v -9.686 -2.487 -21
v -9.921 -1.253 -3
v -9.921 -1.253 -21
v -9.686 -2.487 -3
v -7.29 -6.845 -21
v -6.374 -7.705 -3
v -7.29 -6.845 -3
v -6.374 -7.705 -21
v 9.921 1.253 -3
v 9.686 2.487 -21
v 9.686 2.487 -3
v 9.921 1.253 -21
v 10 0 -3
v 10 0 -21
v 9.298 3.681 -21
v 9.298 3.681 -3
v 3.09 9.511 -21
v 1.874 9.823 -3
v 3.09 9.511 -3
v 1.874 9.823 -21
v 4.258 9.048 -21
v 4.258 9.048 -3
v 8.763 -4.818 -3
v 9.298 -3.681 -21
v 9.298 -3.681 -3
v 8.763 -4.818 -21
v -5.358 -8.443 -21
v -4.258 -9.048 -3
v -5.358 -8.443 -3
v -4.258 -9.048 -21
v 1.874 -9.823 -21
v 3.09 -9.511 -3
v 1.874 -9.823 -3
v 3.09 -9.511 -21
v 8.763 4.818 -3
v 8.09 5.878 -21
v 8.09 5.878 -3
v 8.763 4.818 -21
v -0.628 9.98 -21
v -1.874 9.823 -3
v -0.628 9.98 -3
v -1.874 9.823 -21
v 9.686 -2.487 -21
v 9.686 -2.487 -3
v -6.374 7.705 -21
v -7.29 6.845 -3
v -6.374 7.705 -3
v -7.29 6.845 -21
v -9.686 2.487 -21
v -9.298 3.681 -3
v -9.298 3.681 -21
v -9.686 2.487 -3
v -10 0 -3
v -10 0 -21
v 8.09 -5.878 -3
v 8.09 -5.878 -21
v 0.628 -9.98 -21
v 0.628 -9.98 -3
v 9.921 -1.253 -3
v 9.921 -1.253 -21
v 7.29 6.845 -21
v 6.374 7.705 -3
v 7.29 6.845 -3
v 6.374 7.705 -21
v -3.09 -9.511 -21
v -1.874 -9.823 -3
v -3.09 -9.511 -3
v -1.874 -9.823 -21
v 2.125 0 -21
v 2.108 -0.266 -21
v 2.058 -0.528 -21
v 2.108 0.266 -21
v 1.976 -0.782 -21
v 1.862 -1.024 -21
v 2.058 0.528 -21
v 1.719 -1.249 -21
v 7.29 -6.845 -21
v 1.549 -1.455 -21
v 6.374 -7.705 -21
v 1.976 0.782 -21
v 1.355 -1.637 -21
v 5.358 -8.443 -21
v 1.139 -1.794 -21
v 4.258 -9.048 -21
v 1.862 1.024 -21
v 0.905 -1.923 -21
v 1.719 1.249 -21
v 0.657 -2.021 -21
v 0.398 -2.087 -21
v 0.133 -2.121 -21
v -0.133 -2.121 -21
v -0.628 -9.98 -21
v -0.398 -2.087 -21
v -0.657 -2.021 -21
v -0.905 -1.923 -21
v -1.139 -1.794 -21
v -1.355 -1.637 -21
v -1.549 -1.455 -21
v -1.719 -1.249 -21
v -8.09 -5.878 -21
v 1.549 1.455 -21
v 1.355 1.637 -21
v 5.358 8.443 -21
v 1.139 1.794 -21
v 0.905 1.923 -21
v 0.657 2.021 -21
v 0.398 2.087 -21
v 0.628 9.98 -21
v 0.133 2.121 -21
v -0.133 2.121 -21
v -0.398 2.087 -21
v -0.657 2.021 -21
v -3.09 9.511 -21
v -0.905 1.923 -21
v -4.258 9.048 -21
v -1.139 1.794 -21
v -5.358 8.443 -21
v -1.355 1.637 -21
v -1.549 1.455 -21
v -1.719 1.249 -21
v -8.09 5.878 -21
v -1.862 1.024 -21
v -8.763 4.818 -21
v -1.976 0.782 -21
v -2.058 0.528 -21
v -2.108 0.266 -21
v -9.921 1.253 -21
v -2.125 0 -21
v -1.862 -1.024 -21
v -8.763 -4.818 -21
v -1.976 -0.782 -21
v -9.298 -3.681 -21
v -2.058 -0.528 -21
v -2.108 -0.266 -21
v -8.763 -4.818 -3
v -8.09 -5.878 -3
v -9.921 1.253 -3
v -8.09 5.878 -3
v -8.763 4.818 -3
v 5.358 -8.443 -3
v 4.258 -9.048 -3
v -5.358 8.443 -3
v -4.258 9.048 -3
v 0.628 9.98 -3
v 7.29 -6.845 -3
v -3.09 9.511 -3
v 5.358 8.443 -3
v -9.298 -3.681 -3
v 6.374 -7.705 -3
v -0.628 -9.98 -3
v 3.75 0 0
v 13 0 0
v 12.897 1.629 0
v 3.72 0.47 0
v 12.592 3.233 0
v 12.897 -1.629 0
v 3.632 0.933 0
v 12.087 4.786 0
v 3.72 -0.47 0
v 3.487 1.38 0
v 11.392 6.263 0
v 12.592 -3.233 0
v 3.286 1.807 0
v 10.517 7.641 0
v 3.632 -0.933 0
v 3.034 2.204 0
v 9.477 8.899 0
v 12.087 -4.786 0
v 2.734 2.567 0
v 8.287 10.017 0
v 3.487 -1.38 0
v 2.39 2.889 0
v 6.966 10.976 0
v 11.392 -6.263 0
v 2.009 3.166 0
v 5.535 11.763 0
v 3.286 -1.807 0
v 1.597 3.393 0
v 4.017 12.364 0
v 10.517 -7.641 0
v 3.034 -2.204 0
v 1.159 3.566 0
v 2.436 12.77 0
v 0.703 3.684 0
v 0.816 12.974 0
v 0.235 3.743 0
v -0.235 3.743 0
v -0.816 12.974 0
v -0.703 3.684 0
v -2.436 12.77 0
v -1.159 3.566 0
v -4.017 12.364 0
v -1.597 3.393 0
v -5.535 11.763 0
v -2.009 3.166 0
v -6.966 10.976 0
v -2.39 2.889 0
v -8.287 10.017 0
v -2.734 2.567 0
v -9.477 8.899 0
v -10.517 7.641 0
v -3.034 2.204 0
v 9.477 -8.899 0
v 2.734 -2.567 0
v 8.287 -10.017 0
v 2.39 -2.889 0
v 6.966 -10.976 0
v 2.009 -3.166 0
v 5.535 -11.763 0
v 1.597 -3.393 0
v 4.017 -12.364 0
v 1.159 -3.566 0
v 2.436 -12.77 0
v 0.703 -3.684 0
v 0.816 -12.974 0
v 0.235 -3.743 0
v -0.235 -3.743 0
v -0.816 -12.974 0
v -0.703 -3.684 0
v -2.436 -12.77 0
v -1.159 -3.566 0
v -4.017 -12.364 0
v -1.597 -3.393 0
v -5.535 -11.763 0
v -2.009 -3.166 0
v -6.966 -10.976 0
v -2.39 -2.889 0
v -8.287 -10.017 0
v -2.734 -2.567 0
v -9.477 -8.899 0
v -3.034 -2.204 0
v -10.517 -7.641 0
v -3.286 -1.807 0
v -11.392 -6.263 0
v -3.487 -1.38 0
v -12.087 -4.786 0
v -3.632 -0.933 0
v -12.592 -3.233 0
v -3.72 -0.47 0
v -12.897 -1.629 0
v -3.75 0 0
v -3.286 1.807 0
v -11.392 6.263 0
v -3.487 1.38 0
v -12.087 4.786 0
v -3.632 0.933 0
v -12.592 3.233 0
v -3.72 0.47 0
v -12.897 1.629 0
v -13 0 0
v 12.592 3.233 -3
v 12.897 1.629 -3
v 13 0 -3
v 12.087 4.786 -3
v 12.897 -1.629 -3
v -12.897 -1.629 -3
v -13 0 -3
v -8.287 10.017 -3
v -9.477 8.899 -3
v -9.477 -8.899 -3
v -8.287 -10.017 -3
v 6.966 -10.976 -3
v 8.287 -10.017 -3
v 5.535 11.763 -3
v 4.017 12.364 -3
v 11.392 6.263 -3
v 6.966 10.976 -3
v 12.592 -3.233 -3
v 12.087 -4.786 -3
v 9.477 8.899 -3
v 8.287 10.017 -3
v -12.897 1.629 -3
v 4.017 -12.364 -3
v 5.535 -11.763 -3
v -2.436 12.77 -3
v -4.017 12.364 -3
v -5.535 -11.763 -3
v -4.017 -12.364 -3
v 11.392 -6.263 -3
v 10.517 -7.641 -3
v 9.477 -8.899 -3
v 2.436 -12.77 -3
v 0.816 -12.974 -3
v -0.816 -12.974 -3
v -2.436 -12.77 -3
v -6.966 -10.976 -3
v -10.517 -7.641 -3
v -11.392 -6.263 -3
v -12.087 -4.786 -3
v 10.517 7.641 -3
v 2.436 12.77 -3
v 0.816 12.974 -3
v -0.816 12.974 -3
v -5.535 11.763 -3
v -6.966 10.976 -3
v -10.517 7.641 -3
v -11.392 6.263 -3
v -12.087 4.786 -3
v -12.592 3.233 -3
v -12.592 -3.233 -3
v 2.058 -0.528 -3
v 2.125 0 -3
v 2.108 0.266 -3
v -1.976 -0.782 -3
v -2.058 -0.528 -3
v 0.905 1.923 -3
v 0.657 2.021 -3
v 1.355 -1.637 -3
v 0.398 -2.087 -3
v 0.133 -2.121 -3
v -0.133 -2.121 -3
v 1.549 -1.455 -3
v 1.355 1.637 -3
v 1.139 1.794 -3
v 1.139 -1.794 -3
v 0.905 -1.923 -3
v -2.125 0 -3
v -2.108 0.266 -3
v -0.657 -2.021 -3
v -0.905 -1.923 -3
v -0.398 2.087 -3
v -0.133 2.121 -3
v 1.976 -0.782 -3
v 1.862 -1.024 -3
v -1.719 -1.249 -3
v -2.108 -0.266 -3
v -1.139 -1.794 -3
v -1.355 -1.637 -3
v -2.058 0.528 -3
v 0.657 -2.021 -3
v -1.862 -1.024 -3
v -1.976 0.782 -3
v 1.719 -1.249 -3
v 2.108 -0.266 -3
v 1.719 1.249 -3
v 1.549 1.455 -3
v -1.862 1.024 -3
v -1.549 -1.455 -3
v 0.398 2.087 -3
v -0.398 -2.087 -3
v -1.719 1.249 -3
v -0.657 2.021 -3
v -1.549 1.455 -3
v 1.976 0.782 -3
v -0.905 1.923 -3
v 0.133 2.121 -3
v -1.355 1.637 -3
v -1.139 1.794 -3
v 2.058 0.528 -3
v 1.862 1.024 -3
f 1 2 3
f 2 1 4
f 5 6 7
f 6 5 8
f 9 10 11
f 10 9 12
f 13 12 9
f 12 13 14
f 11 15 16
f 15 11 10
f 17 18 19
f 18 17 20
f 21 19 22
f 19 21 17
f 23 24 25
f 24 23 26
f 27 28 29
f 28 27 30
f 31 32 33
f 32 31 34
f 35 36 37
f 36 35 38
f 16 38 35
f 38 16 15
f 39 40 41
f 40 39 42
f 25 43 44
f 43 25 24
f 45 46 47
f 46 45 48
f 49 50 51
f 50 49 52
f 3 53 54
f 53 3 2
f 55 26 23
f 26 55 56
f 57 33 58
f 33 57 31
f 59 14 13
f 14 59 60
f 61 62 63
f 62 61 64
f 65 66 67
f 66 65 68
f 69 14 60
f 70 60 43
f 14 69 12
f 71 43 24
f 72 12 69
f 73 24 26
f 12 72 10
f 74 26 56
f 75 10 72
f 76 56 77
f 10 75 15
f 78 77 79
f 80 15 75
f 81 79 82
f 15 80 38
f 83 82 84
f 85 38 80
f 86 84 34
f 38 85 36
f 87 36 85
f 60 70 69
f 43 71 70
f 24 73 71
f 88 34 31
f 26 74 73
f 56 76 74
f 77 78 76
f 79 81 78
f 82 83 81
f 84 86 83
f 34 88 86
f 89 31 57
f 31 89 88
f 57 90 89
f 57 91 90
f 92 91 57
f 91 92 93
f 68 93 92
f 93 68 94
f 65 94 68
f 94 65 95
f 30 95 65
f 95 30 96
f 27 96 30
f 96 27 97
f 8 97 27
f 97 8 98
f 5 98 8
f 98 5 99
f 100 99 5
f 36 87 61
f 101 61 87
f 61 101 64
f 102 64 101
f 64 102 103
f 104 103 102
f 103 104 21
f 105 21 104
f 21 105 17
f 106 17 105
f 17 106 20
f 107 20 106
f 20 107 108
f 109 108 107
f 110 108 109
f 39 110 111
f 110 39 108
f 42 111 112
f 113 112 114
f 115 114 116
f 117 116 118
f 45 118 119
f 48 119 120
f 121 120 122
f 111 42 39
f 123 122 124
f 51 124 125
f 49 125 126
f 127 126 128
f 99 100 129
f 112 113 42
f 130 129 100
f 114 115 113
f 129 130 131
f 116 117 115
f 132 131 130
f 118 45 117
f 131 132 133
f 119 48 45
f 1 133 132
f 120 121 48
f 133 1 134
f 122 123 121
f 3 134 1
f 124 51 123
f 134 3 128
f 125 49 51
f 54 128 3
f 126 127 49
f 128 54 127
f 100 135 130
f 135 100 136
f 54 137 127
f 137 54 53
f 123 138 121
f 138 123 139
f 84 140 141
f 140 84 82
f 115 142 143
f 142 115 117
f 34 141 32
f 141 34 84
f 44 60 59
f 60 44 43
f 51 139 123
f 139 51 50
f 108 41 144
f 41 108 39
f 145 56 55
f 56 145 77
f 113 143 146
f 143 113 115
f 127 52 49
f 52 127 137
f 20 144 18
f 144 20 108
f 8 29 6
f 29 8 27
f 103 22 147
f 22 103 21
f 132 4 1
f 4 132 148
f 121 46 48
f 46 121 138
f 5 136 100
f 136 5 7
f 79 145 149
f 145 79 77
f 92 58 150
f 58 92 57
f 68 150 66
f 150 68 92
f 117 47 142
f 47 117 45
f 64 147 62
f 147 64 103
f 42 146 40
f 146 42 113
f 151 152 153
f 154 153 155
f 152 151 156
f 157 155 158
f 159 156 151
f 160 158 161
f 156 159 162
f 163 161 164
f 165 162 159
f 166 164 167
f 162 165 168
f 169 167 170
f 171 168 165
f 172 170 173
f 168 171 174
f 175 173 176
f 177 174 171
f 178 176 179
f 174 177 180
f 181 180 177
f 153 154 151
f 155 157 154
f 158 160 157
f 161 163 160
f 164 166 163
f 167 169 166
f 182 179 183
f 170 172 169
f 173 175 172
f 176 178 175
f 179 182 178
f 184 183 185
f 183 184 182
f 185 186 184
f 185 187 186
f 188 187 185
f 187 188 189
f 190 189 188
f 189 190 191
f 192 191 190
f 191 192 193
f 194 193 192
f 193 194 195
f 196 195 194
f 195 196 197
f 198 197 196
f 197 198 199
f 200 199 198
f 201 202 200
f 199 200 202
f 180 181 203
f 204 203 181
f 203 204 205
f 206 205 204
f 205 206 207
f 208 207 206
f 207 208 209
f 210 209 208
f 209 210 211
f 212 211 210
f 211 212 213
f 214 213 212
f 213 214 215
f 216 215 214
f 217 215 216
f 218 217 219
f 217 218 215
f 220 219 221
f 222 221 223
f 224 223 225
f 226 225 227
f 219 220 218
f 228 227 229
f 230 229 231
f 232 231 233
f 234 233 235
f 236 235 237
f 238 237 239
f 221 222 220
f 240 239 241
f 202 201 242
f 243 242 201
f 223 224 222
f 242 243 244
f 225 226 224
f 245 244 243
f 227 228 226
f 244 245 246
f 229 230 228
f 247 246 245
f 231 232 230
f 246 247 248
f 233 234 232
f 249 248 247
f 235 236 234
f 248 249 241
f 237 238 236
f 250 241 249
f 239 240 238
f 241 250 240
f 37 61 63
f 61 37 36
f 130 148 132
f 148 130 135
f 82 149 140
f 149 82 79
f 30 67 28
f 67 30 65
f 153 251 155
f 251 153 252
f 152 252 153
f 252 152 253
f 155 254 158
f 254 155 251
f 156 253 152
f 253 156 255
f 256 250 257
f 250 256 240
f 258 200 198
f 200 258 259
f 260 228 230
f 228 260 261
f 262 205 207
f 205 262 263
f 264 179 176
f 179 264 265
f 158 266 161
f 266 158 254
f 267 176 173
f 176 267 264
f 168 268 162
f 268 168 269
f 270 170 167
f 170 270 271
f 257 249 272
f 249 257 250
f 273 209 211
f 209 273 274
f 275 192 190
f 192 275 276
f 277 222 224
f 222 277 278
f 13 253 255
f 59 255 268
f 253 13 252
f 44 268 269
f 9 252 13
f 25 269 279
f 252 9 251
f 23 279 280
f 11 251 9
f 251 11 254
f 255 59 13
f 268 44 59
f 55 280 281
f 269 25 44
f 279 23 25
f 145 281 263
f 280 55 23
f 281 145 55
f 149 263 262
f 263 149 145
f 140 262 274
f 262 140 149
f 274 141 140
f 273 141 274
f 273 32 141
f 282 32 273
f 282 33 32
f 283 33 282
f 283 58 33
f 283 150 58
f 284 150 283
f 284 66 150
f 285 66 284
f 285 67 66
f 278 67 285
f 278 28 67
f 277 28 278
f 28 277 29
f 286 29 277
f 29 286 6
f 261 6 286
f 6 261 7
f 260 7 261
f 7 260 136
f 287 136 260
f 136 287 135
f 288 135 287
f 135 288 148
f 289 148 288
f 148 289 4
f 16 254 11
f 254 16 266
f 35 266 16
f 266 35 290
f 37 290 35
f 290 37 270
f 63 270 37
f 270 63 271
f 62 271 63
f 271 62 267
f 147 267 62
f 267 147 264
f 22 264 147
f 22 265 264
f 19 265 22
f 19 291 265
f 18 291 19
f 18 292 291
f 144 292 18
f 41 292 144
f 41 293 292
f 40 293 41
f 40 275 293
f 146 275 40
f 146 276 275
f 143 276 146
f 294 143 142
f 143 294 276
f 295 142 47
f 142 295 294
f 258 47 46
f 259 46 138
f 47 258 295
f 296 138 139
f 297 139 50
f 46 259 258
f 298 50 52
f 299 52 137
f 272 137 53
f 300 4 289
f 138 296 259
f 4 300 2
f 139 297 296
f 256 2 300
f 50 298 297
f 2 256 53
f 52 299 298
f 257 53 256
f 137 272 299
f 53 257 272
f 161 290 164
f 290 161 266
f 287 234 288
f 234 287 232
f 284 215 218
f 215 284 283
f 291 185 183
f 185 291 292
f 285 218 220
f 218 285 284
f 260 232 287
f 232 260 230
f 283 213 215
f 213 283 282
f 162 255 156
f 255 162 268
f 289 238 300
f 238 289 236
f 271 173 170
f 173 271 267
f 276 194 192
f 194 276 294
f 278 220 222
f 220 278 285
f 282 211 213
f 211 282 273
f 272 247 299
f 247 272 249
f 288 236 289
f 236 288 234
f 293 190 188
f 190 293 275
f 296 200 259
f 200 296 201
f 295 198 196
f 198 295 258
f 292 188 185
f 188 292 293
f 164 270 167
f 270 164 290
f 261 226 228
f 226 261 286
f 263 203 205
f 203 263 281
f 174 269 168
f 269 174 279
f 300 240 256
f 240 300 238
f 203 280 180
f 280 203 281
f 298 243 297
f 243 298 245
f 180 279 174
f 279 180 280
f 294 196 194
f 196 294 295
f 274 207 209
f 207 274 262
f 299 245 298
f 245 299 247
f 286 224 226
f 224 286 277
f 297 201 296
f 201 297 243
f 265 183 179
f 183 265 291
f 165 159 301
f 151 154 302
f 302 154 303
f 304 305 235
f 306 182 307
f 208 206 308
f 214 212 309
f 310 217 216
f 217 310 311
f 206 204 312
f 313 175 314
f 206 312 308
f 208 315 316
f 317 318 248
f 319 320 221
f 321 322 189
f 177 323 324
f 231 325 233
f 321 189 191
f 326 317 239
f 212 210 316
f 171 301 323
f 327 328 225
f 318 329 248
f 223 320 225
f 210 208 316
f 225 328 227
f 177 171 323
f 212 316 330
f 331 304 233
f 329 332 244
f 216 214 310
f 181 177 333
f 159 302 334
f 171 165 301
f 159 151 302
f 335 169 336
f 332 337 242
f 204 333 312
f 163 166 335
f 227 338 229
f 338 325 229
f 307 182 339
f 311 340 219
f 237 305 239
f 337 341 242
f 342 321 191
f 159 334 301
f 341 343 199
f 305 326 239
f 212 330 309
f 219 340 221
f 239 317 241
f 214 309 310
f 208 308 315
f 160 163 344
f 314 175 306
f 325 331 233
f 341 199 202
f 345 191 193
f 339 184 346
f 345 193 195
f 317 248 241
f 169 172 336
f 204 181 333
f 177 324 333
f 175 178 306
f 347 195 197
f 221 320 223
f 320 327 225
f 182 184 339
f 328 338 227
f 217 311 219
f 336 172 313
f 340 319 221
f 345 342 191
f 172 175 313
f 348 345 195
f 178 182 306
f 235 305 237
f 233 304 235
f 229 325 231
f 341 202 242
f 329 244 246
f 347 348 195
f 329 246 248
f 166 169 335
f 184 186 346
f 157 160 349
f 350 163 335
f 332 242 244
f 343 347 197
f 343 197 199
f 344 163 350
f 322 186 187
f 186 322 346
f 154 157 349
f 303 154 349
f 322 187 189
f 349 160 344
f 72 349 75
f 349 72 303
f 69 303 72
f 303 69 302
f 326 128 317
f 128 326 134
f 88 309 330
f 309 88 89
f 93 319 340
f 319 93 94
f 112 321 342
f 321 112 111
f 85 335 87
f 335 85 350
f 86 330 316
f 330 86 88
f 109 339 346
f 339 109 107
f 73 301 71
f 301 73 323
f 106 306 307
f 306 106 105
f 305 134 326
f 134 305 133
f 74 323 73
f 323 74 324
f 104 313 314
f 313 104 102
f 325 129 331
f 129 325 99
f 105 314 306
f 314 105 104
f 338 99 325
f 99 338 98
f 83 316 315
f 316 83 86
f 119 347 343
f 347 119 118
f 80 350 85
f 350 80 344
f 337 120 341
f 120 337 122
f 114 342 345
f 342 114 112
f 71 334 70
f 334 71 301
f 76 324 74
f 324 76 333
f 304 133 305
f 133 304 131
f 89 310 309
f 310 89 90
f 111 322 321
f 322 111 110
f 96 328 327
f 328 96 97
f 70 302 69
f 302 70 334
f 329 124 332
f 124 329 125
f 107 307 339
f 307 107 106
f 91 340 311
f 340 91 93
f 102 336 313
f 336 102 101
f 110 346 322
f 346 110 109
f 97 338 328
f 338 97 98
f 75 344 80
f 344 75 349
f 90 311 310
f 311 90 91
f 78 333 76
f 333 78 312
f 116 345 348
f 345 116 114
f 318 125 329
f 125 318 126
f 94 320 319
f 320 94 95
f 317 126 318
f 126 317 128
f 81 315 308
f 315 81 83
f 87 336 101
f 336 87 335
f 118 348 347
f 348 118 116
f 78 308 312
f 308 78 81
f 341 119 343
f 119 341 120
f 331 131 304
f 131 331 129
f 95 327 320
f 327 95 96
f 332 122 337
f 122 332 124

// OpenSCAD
$fn = 50;


difference() {
	union() {
		translate(v = [0, 0, -21.0000000000]) {
			cylinder(h = 21, r = 10.0000000000);
		}
		translate(v = [0, 0, -3.0000000000]) {
			cylinder(h = 3, r = 13.0000000000);
		}
	}
	union() {
		translate(v = [0, 0, 0]) {
			rotate(a = [0, 0, 0]) {
				difference() {
					union() {
						#translate(v = [0, 0, -21.0000000000]) {
							cylinder(h = 21, r = 2.0000000000);
						}
						#translate(v = [0, 0, -3]) {
							cylinder(h = 3, r = 10.0000000000, r1 = 2.1250000000, r2 = 3.7500000000);
						}
						#translate(v = [0, 0, -21.0000000000]) {
							cylinder(h = 21, r = 2.1250000000);
						}
						#translate(v = [0, 0, -21.0000000000]) {
							cylinder(h = 21, r = 2.0000000000);
						}
					}
					union();
				}
			}
		}
	}
}
